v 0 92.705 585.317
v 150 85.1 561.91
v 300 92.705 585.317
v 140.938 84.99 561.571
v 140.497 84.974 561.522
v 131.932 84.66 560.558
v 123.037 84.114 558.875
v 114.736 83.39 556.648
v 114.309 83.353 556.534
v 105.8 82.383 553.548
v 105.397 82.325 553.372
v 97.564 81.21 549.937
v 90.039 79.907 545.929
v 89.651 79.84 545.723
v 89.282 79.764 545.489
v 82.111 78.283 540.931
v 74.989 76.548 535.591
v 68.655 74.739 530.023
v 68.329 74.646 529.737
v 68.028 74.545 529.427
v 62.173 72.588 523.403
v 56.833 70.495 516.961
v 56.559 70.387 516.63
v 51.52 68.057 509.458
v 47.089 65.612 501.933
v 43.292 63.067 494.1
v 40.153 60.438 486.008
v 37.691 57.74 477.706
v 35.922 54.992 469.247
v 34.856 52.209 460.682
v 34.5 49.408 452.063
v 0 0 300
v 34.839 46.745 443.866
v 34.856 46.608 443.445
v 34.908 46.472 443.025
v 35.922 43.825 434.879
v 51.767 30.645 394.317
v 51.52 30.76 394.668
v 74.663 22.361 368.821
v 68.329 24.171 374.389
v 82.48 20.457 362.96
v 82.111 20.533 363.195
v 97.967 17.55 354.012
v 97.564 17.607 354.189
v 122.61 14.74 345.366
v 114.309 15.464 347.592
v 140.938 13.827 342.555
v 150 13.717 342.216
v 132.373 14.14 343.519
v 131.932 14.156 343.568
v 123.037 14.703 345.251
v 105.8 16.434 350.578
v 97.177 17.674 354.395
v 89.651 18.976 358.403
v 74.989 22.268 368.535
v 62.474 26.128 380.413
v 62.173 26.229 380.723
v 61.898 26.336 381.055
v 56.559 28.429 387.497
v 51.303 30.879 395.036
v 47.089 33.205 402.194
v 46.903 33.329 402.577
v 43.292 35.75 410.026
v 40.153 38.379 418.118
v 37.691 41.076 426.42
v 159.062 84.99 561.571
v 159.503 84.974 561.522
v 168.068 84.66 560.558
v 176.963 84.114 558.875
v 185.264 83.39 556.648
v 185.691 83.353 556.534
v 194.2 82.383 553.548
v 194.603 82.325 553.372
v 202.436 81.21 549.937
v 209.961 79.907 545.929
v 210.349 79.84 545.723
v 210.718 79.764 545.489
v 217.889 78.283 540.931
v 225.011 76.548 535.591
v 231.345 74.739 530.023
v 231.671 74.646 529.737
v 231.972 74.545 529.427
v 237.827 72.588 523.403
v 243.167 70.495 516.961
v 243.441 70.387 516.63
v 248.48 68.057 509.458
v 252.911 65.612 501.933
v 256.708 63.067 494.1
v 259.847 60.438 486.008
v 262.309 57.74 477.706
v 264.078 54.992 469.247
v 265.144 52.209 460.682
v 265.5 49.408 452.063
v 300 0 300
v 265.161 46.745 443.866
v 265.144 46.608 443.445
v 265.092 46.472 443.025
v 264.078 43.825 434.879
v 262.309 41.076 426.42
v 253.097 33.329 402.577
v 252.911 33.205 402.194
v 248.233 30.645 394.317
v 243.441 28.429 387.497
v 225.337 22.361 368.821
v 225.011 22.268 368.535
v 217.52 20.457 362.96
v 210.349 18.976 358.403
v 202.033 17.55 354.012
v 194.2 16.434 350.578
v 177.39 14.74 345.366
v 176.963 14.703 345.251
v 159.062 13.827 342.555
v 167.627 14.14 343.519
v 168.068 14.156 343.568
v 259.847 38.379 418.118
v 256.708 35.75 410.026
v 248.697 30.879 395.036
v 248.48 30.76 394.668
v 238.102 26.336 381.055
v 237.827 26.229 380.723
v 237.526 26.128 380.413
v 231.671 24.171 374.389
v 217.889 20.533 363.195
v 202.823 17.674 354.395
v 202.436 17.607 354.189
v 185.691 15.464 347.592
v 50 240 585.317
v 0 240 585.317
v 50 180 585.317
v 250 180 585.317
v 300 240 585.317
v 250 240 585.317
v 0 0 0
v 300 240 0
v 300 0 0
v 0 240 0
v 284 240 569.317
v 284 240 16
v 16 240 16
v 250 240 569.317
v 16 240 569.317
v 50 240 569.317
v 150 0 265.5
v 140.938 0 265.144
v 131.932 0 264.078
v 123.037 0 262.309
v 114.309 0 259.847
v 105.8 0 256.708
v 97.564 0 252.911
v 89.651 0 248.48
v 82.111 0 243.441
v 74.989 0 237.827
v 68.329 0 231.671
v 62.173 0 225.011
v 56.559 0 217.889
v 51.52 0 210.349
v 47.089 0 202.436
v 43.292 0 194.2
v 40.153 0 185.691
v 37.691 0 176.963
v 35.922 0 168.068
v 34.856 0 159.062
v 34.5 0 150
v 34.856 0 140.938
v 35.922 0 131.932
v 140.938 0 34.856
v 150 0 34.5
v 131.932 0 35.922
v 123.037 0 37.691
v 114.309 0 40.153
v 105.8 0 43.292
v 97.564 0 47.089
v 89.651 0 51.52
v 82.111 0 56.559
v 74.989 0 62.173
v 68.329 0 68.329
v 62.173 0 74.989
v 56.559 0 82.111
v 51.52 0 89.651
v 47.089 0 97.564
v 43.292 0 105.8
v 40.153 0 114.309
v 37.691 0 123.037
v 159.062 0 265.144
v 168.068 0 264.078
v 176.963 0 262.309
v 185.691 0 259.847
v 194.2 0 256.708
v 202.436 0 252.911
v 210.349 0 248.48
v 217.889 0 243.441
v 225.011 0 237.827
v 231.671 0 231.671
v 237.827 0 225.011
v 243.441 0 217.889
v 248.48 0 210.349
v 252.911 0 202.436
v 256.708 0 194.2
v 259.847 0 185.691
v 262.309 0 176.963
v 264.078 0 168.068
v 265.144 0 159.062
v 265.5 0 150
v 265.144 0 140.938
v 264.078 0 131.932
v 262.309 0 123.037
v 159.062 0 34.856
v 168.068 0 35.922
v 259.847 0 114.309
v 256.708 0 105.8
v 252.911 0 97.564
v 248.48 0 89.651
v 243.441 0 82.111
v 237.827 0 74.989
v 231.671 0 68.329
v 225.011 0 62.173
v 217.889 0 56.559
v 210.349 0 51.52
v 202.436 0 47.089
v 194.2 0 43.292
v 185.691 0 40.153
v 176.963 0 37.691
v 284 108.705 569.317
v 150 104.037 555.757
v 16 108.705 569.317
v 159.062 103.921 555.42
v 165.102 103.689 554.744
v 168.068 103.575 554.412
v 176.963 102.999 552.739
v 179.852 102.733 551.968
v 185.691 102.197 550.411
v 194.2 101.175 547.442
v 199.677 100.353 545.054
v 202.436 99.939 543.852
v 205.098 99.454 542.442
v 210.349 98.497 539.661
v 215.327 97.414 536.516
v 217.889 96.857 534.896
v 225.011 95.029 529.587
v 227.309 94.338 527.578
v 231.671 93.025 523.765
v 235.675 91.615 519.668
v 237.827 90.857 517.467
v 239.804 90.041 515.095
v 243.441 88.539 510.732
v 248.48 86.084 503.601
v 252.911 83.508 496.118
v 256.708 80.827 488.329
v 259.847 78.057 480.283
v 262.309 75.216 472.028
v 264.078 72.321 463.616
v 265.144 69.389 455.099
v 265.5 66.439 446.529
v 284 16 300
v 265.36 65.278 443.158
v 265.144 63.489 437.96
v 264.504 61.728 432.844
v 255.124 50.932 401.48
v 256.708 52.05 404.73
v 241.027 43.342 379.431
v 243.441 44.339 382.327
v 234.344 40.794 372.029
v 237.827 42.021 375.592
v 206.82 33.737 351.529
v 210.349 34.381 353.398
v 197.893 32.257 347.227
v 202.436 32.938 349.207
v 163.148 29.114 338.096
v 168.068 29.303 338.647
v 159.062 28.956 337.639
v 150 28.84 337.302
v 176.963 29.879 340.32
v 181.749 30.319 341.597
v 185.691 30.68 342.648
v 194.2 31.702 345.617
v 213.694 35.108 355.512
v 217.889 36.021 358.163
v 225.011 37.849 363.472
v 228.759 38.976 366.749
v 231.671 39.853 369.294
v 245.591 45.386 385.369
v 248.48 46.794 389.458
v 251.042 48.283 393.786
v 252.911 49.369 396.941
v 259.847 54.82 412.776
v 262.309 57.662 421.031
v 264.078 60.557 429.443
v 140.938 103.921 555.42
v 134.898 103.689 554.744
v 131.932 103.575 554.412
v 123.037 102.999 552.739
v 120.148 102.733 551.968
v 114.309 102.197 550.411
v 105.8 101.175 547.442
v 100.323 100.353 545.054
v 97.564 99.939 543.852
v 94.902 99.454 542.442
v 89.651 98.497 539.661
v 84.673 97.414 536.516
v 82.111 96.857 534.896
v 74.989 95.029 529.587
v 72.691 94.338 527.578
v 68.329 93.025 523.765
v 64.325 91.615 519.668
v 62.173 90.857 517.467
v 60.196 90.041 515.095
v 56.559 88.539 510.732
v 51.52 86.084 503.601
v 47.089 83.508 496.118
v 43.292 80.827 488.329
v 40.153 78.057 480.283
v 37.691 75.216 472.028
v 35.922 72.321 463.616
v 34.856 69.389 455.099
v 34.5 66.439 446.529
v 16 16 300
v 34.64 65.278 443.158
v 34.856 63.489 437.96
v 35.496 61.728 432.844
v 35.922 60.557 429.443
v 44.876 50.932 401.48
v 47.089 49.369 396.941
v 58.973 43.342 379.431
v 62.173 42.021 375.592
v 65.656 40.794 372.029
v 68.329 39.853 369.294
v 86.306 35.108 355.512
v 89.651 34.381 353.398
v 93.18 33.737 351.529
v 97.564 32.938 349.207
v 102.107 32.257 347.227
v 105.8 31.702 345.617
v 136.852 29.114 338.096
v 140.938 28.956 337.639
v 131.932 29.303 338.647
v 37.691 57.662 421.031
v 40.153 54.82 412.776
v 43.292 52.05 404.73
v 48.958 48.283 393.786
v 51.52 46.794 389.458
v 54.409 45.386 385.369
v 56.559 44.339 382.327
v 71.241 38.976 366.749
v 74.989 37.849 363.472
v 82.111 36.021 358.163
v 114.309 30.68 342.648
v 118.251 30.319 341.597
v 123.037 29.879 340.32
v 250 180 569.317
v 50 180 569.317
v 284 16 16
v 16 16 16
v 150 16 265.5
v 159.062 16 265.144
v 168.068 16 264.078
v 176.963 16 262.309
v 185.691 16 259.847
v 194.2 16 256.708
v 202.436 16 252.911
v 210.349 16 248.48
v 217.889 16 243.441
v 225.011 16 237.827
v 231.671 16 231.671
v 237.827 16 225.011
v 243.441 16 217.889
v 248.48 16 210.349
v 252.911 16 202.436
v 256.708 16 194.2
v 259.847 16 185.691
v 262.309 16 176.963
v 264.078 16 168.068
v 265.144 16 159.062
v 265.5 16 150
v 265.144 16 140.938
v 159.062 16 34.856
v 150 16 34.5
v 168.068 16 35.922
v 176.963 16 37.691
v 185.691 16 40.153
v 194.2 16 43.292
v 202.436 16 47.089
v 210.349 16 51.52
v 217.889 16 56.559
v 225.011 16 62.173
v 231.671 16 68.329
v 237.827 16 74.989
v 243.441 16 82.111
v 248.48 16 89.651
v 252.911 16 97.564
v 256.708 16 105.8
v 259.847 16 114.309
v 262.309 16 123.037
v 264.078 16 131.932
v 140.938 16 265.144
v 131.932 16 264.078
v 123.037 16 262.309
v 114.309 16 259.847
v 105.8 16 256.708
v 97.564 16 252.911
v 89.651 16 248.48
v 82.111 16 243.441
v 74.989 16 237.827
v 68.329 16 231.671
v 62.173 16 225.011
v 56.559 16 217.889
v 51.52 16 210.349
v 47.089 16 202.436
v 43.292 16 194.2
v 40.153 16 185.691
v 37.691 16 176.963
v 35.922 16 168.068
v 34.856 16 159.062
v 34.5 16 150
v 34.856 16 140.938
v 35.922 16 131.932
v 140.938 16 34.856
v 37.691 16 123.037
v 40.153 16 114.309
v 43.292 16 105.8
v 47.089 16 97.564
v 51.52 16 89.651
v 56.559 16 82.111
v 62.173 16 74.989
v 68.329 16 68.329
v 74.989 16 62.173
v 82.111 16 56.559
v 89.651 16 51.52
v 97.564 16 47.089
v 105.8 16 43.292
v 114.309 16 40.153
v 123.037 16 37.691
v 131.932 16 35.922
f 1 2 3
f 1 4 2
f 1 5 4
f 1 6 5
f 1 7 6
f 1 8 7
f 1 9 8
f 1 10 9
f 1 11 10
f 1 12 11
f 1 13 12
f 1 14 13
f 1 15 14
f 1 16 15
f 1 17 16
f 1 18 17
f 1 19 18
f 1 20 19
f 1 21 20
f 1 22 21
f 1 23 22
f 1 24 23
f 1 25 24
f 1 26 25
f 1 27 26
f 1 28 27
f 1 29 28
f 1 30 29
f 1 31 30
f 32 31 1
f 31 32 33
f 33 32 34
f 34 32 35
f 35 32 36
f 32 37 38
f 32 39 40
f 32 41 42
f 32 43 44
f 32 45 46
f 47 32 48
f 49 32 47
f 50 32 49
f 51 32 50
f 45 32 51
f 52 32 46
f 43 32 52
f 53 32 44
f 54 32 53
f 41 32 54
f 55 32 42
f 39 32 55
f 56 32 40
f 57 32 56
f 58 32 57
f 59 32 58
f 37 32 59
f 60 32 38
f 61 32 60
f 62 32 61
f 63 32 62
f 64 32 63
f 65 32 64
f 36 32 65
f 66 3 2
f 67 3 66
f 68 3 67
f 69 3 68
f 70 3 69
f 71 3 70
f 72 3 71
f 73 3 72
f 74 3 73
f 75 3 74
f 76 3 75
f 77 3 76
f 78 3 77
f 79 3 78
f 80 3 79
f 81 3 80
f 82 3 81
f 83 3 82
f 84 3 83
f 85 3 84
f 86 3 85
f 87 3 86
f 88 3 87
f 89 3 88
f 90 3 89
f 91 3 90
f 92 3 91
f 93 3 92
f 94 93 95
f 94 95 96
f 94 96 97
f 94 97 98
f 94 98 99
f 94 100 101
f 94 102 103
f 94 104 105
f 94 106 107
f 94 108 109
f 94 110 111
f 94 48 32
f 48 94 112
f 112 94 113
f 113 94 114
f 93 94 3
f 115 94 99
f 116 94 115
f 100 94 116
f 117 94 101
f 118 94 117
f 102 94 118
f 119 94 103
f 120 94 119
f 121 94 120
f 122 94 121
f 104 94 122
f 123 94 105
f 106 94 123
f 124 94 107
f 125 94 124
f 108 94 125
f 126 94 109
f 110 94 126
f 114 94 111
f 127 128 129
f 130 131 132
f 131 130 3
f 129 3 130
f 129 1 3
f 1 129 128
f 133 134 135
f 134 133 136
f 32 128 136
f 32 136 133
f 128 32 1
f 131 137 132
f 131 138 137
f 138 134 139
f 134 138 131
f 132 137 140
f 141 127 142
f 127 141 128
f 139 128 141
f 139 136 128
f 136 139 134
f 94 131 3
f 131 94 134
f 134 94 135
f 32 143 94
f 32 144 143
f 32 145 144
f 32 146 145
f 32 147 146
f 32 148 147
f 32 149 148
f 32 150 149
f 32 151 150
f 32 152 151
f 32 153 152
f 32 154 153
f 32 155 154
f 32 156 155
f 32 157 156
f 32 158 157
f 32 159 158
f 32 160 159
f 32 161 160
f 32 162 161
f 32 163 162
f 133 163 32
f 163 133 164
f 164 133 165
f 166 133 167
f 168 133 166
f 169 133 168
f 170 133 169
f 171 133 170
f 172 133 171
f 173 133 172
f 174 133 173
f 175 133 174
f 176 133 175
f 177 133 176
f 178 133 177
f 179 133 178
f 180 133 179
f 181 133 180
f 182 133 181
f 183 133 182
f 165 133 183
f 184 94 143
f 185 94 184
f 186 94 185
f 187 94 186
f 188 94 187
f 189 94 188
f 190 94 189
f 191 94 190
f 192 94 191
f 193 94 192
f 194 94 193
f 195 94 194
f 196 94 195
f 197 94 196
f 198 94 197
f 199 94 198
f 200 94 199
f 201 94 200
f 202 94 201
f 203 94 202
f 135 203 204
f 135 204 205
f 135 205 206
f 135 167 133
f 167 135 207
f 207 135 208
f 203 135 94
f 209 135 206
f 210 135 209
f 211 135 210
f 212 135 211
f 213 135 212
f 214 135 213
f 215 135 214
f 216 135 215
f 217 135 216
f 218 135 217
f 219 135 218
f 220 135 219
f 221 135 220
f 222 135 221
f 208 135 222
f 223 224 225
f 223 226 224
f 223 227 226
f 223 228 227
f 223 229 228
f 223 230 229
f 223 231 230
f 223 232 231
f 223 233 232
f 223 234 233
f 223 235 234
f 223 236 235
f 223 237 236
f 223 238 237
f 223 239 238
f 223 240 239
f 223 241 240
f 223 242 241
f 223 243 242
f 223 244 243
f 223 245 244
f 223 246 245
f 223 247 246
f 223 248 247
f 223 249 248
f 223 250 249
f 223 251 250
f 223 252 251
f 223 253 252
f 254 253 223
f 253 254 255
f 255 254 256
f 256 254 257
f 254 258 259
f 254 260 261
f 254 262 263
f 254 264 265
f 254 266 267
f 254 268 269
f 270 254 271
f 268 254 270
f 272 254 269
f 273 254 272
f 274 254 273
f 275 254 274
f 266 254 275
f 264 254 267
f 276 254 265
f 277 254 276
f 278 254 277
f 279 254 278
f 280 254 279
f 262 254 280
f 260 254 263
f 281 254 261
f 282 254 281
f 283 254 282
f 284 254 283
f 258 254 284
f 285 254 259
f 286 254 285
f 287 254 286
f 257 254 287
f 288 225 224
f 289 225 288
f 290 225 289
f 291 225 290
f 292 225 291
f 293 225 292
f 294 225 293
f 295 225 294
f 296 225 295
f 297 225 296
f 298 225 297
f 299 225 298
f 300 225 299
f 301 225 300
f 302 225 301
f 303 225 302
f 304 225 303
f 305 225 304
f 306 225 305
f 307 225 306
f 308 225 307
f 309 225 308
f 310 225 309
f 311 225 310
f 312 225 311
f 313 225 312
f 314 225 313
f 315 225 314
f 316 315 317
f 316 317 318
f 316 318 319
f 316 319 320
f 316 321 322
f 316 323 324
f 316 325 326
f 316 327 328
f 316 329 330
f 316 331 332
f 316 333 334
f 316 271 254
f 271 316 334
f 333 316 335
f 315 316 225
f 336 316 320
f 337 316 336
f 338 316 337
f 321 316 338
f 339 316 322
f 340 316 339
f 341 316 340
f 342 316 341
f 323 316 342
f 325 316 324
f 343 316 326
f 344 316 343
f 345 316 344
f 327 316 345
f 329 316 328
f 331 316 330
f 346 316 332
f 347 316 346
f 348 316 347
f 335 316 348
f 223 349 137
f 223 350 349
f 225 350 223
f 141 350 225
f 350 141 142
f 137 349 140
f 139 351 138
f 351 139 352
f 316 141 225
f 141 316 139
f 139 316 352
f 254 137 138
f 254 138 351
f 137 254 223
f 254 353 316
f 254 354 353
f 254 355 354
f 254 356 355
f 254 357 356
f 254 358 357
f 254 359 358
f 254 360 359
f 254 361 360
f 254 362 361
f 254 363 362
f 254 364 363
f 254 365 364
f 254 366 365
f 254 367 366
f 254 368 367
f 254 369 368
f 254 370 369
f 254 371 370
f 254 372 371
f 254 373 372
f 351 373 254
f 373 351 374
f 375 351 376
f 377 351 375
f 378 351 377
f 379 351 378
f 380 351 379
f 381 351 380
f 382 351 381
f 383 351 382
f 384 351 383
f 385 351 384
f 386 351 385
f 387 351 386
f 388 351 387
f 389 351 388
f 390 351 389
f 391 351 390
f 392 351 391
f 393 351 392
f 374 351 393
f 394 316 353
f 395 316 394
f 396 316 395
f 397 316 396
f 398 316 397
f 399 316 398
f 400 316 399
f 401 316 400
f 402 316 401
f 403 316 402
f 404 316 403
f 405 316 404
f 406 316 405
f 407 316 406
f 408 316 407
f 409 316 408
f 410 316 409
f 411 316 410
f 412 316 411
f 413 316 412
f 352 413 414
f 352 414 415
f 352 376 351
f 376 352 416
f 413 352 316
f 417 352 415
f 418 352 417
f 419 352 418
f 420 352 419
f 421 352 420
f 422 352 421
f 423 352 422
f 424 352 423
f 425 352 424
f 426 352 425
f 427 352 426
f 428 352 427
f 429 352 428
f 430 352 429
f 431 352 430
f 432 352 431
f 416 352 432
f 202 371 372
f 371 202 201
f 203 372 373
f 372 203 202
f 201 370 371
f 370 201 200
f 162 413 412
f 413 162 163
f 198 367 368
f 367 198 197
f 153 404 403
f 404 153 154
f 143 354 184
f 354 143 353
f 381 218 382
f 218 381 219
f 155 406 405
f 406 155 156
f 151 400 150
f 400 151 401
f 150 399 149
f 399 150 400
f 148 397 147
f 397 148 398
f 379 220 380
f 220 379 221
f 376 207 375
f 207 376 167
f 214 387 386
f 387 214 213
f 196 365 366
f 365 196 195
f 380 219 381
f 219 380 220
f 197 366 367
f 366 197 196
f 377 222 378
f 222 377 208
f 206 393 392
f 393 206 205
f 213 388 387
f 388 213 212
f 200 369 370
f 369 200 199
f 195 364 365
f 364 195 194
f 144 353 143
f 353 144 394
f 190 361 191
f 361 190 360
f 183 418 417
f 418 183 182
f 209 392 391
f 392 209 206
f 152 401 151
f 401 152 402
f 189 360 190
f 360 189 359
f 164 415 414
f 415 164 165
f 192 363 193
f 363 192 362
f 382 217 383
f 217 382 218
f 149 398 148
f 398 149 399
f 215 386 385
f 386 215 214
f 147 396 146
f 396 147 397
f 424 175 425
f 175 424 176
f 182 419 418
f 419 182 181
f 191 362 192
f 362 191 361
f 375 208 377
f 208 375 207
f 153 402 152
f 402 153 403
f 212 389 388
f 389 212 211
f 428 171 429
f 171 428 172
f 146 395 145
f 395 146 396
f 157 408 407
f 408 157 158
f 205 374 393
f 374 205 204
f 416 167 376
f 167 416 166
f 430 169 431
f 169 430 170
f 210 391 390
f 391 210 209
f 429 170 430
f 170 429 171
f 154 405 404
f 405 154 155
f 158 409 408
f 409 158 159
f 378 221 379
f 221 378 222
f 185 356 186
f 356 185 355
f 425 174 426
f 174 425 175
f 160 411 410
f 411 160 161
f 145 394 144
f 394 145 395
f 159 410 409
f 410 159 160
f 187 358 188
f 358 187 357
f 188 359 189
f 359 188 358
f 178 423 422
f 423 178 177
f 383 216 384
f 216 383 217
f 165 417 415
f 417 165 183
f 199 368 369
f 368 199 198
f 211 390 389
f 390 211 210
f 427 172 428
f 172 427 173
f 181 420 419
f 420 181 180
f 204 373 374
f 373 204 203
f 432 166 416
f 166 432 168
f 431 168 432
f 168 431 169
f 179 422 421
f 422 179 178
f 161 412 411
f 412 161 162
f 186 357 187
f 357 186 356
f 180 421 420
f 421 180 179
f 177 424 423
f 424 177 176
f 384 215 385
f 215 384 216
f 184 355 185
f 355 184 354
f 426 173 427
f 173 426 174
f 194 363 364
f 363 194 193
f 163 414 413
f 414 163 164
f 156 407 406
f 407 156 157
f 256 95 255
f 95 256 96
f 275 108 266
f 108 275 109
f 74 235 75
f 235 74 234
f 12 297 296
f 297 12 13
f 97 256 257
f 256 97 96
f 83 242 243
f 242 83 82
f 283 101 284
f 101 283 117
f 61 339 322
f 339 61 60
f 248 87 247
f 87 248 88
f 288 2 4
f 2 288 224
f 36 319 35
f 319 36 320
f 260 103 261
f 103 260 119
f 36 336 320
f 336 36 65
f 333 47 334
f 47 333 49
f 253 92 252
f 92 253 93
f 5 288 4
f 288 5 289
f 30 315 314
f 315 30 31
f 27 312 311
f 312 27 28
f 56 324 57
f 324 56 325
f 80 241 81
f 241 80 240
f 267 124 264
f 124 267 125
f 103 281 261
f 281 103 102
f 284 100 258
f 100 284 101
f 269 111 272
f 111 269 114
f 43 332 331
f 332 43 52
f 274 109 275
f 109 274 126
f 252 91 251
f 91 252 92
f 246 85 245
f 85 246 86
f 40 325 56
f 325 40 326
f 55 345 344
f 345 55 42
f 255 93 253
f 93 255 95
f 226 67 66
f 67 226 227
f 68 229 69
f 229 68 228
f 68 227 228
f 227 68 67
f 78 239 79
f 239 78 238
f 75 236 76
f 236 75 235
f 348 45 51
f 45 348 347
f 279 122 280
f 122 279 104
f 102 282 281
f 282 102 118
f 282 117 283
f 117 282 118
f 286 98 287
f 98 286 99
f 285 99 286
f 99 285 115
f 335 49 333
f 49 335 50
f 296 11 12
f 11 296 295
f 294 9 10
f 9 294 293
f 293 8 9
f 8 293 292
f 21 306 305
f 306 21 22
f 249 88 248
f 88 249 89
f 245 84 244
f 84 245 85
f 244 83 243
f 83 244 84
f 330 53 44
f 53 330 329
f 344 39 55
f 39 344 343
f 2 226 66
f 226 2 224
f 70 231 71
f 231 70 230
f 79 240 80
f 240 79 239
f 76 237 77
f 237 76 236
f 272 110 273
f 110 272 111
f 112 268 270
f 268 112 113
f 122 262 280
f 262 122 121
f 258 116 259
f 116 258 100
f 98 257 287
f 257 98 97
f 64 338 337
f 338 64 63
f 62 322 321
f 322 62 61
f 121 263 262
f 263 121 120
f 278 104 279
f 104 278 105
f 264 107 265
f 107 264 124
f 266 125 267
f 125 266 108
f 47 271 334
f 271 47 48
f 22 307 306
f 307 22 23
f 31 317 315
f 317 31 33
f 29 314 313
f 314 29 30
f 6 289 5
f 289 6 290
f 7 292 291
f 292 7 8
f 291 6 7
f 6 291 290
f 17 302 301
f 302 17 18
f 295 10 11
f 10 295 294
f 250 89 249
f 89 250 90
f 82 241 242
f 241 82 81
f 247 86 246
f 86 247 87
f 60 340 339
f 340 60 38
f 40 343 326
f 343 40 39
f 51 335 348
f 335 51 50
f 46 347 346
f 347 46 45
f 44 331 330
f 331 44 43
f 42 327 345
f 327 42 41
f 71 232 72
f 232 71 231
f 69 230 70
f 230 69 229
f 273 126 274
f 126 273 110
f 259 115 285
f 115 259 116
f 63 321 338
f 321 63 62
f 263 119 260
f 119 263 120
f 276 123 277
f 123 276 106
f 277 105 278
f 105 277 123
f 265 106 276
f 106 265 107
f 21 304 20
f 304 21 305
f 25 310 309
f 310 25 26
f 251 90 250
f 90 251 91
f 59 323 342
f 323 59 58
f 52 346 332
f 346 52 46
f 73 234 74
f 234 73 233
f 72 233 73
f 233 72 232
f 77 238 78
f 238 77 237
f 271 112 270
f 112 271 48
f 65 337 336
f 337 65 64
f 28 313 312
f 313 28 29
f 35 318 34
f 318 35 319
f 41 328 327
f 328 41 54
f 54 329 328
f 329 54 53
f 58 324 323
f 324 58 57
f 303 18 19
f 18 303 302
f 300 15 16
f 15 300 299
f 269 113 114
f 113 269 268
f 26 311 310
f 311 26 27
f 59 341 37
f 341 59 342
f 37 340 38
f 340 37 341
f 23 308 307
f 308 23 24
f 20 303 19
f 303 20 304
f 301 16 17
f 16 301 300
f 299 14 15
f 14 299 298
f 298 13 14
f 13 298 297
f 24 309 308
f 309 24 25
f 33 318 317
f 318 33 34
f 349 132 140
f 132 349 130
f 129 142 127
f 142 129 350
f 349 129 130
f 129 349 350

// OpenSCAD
$fn = 80;

thick = 16;
width = 300;
depth = 240;
speaker = 259;
spholer = 231/2;

ctrwidth = 200;
ctrdepth = 60;

angle = 18;

upheight = cos(angle) * width;
upoff = sin(angle) * width;

height = upheight + width;
volume = (height*width/1e4 + height*depth/1e4*2)*(thick/100)
			- 2*(spholer*spholer*3.1416/1e4)*(thick/100)
			- (ctrwidth*ctrdepth/1e4)*thick/100;

echo("height", height);
echo("walnut", volume * 0.57);
echo("pine", volume * 0.42);

difference()
{
	rotate([90, 0, 90])
		difference()
		{
			linear_extrude(width)
				polygon([	[    0, 0],
							[    0, width],
							[upoff, height], 
							[depth, height],
							[depth, 0]]);


			translate([0, 0, thick])
			linear_extrude(width - thick*2)
				polygon([	[thick, thick],
							[thick, width], 
							[upoff + thick, height - thick], 
							[depth, height - thick],
							[depth, thick]]);
		}

	translate([width / 2, thick+1, width / 2])
		rotate([90, 0, 0])
			cylinder(thick + 2, spholer, spholer);

	translate([width/2, upoff/2 + thick*2, height - upheight/2])
		rotate([90 - angle, 0, 0])
			cylinder(thick * 2, spholer, spholer);

	translate([width/2 - ctrwidth/2, depth - ctrdepth, height - thick - 1])
		cube([ctrwidth, ctrdepth, thick + 2]);
}
